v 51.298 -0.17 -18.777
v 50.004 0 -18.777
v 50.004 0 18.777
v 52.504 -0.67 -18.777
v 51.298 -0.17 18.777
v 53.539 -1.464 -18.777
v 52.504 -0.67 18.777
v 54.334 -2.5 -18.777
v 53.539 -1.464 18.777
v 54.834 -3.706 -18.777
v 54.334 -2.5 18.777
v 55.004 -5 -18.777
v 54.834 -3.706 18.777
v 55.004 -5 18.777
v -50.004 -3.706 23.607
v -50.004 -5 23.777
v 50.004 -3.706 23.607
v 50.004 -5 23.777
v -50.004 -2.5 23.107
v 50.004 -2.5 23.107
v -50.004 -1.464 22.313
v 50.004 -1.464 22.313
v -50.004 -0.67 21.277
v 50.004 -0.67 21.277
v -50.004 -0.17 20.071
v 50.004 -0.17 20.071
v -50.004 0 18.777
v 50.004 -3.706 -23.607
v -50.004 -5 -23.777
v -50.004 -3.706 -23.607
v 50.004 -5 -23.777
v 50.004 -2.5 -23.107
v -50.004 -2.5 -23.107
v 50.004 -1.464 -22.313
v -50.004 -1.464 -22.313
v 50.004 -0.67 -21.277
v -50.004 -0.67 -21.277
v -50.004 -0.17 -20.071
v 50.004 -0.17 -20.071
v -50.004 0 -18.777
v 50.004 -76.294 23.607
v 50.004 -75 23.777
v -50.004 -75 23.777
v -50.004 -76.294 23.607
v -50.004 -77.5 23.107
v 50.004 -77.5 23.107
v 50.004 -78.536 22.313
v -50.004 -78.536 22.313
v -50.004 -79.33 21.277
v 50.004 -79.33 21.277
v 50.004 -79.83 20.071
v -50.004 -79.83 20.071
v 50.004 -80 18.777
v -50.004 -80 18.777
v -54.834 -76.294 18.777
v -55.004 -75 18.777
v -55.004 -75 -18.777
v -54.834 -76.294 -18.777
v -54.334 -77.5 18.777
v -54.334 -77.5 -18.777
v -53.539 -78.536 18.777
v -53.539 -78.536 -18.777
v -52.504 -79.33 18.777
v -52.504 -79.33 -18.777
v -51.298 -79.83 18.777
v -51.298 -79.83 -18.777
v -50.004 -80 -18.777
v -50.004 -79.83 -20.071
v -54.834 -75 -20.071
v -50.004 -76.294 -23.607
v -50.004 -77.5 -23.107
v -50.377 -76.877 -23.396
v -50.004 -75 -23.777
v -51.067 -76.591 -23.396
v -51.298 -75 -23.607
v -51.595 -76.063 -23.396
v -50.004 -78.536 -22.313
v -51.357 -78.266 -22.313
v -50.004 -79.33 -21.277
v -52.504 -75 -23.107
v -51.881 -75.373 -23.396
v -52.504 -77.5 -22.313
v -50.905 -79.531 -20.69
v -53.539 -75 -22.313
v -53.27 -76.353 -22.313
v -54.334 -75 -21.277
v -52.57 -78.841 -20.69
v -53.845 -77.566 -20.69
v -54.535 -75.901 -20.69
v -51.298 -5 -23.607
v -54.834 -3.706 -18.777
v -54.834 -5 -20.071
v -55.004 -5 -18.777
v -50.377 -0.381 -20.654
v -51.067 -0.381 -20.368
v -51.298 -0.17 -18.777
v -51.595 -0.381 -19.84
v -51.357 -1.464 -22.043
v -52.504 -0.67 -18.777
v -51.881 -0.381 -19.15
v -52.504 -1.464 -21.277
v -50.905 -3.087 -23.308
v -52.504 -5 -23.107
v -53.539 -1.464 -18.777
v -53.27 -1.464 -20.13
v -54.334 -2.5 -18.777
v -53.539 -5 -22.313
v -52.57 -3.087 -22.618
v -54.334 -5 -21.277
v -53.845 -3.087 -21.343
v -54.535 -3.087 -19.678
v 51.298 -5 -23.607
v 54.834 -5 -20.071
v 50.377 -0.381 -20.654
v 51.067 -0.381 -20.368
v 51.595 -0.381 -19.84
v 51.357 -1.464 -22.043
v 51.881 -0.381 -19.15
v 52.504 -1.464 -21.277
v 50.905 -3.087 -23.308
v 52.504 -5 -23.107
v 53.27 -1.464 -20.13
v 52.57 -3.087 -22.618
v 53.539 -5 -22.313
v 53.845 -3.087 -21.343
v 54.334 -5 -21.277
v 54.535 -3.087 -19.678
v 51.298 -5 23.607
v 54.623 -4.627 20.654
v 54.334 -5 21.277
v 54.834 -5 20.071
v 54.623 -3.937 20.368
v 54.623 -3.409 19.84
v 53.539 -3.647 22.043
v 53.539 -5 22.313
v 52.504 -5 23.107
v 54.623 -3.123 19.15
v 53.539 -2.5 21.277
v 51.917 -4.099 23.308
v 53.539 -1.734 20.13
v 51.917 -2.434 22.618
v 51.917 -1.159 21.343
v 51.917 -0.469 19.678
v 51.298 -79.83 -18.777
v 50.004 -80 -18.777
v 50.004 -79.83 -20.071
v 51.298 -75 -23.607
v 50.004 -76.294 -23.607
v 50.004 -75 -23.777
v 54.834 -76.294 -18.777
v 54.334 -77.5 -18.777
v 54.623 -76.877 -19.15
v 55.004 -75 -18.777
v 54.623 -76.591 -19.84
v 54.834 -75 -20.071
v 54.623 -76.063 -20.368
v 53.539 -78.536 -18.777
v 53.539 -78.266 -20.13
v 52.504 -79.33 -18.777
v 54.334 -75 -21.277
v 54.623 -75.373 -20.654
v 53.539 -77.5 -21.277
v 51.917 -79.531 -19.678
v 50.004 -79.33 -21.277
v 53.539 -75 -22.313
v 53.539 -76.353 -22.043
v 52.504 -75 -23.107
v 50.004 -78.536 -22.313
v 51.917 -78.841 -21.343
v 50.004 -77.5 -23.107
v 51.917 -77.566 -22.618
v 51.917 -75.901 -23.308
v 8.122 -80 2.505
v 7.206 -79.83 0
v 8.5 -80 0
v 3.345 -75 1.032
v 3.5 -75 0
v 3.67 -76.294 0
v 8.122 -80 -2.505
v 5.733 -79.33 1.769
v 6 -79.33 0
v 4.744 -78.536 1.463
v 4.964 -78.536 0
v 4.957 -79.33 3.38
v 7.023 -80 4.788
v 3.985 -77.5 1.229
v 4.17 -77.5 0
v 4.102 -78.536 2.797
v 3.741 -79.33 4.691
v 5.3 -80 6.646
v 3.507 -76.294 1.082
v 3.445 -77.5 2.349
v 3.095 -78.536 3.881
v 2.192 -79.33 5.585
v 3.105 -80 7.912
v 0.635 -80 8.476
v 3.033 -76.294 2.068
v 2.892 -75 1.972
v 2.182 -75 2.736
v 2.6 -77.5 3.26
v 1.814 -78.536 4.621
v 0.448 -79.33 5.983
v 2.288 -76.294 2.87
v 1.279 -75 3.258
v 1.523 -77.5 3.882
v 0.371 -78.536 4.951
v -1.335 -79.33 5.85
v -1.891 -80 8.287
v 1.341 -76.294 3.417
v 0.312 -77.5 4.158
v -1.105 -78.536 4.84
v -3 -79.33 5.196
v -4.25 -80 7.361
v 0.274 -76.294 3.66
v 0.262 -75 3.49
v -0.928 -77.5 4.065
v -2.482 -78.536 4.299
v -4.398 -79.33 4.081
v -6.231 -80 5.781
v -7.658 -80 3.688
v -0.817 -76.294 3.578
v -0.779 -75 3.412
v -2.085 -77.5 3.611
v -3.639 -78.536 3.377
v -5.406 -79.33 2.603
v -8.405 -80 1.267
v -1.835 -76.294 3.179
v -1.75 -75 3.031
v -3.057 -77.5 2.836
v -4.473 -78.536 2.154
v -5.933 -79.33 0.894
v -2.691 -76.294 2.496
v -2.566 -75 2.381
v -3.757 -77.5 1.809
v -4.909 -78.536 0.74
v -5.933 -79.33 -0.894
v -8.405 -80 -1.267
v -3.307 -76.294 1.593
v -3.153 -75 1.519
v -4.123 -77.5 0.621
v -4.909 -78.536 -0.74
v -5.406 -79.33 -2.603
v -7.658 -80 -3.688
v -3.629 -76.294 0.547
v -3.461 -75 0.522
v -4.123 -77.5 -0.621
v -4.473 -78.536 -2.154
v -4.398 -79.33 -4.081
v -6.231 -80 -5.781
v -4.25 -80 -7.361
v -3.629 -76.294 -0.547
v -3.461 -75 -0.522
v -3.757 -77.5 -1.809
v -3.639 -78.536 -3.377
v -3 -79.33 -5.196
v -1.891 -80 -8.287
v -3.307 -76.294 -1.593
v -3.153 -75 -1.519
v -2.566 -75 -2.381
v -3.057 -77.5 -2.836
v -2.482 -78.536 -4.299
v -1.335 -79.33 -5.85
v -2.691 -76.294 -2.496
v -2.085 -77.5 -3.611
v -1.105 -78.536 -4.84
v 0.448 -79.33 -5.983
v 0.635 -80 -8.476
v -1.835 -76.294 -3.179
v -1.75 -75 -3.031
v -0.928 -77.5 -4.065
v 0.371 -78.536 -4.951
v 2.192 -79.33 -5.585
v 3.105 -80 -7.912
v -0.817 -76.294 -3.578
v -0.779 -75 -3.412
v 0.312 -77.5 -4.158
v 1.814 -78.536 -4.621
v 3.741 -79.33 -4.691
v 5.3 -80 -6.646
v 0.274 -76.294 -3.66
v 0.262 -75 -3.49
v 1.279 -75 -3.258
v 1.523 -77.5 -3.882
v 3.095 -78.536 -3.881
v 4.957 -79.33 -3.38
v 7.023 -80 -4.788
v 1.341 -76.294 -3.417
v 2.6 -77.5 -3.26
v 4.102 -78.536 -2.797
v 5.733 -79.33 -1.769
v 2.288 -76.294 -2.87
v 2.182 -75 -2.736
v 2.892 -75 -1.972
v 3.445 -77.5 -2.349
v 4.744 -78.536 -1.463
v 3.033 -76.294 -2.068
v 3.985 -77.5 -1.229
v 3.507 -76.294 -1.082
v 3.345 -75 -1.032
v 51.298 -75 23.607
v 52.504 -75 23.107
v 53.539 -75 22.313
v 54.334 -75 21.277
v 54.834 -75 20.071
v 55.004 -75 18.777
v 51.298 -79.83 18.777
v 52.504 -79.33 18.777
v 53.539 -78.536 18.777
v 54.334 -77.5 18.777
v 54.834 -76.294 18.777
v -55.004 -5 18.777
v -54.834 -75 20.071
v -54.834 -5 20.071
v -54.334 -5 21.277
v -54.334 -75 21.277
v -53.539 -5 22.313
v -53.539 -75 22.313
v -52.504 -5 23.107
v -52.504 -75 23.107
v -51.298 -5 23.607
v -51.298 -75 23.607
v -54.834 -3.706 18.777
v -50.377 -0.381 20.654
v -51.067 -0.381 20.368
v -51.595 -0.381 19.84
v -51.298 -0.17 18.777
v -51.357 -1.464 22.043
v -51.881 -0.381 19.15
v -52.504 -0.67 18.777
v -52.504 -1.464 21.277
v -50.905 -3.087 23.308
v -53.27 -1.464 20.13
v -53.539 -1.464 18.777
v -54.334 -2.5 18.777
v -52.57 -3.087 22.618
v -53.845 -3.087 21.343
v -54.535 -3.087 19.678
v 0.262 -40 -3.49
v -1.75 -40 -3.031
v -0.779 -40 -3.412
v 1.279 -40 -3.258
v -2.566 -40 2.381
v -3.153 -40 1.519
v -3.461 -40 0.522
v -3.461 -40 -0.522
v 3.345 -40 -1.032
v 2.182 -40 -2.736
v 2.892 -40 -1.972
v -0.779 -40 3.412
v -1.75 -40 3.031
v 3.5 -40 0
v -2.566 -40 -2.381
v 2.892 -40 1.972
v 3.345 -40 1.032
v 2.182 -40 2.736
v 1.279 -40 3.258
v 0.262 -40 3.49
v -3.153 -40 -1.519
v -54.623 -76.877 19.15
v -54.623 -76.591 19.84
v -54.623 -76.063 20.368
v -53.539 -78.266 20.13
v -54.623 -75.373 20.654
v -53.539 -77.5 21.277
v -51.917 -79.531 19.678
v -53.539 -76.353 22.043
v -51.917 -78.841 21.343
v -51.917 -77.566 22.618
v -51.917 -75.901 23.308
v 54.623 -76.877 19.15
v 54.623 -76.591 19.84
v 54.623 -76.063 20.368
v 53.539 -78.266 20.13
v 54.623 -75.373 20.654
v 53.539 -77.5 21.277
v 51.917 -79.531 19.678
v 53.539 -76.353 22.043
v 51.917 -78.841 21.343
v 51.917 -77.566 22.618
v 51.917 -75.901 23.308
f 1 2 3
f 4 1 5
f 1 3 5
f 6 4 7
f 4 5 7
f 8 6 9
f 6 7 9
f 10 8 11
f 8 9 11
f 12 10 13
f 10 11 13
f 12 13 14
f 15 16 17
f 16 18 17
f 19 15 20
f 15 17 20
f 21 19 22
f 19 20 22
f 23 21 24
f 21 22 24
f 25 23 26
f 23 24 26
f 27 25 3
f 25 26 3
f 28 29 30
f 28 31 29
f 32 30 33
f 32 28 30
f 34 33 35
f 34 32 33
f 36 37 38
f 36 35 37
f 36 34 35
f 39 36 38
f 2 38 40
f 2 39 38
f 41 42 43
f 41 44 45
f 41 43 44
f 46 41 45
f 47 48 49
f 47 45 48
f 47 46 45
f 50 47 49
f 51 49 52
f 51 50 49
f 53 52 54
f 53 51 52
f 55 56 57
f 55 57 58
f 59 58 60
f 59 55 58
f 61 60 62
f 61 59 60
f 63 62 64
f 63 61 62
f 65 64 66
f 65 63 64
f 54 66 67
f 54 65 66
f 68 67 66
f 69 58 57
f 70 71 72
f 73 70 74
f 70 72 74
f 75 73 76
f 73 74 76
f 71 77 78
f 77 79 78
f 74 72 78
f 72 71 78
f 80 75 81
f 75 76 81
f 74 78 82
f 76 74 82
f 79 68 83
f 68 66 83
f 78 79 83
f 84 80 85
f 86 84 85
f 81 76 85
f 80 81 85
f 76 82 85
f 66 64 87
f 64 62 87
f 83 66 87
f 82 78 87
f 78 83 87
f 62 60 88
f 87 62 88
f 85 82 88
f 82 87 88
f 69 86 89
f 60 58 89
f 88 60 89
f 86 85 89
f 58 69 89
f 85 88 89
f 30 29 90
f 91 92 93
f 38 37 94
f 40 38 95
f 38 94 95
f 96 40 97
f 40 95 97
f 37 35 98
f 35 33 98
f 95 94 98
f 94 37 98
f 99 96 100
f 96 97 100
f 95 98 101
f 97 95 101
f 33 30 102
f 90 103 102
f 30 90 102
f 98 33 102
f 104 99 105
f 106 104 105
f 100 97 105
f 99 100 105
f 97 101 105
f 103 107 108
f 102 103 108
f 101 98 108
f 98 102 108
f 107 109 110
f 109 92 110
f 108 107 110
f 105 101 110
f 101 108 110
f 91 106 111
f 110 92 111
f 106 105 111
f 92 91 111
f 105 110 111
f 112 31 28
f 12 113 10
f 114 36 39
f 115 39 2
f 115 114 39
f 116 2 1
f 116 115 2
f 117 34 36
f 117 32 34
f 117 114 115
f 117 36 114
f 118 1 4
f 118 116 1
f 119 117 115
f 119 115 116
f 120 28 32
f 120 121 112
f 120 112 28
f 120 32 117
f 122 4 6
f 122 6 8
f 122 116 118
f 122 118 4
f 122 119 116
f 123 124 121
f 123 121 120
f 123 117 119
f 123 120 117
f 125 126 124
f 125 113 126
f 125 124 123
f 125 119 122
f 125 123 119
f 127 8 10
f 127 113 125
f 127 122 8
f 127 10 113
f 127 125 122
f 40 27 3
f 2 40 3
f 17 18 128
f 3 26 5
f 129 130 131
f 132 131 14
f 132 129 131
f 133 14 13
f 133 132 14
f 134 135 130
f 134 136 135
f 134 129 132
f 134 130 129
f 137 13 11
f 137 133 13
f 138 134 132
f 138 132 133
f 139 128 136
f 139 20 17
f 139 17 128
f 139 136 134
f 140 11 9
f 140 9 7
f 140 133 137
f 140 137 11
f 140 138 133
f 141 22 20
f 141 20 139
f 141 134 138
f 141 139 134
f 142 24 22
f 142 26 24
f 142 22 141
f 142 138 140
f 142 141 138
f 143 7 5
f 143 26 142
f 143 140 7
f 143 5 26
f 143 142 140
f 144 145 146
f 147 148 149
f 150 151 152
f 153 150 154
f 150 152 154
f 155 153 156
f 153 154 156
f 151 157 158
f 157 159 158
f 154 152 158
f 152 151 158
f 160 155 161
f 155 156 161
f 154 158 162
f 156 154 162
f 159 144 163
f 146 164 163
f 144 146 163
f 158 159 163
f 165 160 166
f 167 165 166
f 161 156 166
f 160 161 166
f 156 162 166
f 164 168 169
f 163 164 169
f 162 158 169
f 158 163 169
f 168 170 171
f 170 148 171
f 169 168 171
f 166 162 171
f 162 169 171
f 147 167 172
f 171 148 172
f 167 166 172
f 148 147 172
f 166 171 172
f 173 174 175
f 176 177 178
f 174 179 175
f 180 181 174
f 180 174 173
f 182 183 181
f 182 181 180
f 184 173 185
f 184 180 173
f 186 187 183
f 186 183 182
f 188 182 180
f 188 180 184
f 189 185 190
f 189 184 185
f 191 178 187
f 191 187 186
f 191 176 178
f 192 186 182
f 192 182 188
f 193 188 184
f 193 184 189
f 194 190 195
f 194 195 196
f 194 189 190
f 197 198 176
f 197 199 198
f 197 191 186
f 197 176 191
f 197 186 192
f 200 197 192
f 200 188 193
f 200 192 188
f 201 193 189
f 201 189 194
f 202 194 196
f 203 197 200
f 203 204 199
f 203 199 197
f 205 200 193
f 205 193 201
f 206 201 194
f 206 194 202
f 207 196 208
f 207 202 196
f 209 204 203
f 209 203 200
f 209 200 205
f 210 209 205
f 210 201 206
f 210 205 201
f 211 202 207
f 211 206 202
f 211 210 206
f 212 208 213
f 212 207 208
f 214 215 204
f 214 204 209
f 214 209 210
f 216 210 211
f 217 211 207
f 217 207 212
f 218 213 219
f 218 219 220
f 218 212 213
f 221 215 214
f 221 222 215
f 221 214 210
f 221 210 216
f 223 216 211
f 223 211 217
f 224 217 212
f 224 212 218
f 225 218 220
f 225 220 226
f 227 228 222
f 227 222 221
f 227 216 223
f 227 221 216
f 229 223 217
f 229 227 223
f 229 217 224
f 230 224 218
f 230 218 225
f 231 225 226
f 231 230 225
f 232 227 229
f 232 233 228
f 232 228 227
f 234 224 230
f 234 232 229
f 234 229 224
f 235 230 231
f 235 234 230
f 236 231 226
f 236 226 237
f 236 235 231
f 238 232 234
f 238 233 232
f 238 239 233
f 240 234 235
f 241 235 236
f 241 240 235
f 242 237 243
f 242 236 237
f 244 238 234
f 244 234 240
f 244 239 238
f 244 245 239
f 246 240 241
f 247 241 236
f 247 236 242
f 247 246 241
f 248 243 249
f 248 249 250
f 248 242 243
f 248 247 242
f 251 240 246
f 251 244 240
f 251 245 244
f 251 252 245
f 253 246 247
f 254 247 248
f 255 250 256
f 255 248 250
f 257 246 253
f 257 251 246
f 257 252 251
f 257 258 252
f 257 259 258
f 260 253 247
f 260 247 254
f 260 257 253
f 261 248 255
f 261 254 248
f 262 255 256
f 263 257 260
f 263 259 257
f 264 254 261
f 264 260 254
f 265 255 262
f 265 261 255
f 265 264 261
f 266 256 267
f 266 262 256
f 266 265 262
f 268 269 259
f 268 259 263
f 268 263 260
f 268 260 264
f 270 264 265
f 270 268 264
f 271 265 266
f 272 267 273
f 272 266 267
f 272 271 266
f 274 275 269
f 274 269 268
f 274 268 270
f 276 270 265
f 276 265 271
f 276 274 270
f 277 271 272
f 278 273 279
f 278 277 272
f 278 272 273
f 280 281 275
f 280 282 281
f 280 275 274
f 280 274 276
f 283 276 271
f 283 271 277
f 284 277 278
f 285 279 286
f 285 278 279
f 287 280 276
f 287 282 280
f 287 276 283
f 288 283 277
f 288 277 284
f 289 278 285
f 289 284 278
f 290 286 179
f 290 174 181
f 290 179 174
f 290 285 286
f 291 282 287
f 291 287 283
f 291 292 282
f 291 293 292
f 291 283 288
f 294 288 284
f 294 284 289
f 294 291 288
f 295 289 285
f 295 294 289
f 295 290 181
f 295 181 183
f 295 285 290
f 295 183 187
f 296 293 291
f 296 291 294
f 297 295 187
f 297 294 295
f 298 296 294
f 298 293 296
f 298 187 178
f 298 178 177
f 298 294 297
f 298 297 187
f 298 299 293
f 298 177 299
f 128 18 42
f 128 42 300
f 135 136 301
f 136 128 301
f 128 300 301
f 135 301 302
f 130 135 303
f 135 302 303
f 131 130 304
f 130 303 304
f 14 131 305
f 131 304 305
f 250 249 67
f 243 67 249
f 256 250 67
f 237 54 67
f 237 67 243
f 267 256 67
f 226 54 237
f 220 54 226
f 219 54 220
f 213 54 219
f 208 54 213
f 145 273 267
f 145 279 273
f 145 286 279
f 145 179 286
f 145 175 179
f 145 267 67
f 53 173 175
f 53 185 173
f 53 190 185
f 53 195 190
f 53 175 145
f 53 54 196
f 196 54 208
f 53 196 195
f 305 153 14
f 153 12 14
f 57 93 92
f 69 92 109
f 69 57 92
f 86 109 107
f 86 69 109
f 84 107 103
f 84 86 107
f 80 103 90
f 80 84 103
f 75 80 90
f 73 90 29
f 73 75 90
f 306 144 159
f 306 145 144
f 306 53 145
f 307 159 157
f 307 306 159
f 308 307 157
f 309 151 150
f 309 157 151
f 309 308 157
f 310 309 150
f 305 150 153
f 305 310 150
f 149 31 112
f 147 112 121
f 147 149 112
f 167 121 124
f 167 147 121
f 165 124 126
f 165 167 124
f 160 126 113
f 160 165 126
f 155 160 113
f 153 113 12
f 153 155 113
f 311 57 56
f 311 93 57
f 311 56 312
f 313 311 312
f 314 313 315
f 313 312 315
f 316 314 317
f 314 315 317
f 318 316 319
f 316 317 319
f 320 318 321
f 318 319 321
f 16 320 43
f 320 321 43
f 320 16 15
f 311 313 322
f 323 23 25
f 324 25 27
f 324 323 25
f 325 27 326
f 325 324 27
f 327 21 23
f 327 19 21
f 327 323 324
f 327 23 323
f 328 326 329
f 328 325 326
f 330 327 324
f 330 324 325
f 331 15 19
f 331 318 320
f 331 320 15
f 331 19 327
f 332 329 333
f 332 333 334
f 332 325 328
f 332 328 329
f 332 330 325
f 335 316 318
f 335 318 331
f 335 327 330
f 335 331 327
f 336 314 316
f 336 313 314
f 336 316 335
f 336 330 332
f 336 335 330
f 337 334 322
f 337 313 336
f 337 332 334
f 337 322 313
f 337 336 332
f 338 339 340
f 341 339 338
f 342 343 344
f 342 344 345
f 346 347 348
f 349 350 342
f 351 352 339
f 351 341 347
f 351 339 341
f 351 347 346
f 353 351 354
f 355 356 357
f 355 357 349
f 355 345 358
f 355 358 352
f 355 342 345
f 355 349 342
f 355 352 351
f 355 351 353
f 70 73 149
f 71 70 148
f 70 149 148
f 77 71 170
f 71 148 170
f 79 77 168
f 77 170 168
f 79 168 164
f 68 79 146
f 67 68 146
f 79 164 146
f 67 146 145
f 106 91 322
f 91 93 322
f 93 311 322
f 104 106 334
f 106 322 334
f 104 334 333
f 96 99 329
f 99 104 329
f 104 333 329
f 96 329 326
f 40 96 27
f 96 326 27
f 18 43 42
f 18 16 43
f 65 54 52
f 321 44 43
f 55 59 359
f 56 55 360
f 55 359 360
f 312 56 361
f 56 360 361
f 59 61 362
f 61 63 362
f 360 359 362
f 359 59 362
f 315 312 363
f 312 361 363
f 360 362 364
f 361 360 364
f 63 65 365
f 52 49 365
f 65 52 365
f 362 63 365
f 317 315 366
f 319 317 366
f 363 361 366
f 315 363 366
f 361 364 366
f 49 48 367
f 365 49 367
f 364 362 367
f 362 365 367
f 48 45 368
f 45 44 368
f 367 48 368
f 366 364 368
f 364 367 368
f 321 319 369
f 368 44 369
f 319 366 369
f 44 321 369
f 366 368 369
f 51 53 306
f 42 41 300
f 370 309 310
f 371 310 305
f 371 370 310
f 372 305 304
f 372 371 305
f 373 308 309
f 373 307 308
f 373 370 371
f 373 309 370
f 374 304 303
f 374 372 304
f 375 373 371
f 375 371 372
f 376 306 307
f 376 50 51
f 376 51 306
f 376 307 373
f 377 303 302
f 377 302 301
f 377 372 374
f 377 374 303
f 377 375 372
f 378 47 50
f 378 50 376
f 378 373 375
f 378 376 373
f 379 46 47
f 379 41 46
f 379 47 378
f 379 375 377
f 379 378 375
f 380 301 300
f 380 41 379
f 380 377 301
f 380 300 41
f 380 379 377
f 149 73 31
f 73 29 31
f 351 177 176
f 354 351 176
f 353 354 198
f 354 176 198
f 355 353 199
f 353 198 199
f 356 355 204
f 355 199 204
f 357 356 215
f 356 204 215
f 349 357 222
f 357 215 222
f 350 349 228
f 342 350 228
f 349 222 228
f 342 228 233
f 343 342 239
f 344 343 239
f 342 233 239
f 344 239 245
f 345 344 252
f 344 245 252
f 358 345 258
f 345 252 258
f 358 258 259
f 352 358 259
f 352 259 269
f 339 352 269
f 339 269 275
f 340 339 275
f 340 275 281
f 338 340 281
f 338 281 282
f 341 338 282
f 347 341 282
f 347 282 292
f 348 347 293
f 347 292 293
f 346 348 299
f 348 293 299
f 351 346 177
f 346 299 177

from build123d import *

# Parameters (mm, degrees)
F0_W     = 110.007778
F0_H     = 47.554146
F1_DEPTH = 80
F2_R     = 3.5
F3_DEPTH = 40
F4_R     = 5


with BuildPart() as f1:
    # F0 (on Front) → F1 (new body)
    with BuildSketch(Plane.XZ):
        Rectangle(F0_W, F0_H)
    extrude(amount=F1_DEPTH)

    # F2 (on face) → F3 (cut)
    with BuildSketch(Plane.XZ.offset(80)):
        Circle(F2_R)
    extrude(amount=-F3_DEPTH, mode=Mode.SUBTRACT)

    # F4
    f4_edges = [f1.edges().sort_by_distance(p)[0] for p in [
        (0, -80, 23.777073),
        (-55.003889, -80, 0),
        (0, -80, -23.777073),
        (55.003889, -80, 0),
        (-55.003889, -40, 23.777073),
        (0, 0, 23.777073),
        (55.003889, -40, 23.777073),
        (55.003889, -40, -23.777073),
        (-55.003889, -40, -23.777073),
        (0, 0, -23.777073),
        (55.003889, 0, 0),
        (-55.003889, 0, 0),
        (-3.5, -80, 0),
    ]]
    fillet(f4_edges, radius=F4_R)


solid = f1.part
